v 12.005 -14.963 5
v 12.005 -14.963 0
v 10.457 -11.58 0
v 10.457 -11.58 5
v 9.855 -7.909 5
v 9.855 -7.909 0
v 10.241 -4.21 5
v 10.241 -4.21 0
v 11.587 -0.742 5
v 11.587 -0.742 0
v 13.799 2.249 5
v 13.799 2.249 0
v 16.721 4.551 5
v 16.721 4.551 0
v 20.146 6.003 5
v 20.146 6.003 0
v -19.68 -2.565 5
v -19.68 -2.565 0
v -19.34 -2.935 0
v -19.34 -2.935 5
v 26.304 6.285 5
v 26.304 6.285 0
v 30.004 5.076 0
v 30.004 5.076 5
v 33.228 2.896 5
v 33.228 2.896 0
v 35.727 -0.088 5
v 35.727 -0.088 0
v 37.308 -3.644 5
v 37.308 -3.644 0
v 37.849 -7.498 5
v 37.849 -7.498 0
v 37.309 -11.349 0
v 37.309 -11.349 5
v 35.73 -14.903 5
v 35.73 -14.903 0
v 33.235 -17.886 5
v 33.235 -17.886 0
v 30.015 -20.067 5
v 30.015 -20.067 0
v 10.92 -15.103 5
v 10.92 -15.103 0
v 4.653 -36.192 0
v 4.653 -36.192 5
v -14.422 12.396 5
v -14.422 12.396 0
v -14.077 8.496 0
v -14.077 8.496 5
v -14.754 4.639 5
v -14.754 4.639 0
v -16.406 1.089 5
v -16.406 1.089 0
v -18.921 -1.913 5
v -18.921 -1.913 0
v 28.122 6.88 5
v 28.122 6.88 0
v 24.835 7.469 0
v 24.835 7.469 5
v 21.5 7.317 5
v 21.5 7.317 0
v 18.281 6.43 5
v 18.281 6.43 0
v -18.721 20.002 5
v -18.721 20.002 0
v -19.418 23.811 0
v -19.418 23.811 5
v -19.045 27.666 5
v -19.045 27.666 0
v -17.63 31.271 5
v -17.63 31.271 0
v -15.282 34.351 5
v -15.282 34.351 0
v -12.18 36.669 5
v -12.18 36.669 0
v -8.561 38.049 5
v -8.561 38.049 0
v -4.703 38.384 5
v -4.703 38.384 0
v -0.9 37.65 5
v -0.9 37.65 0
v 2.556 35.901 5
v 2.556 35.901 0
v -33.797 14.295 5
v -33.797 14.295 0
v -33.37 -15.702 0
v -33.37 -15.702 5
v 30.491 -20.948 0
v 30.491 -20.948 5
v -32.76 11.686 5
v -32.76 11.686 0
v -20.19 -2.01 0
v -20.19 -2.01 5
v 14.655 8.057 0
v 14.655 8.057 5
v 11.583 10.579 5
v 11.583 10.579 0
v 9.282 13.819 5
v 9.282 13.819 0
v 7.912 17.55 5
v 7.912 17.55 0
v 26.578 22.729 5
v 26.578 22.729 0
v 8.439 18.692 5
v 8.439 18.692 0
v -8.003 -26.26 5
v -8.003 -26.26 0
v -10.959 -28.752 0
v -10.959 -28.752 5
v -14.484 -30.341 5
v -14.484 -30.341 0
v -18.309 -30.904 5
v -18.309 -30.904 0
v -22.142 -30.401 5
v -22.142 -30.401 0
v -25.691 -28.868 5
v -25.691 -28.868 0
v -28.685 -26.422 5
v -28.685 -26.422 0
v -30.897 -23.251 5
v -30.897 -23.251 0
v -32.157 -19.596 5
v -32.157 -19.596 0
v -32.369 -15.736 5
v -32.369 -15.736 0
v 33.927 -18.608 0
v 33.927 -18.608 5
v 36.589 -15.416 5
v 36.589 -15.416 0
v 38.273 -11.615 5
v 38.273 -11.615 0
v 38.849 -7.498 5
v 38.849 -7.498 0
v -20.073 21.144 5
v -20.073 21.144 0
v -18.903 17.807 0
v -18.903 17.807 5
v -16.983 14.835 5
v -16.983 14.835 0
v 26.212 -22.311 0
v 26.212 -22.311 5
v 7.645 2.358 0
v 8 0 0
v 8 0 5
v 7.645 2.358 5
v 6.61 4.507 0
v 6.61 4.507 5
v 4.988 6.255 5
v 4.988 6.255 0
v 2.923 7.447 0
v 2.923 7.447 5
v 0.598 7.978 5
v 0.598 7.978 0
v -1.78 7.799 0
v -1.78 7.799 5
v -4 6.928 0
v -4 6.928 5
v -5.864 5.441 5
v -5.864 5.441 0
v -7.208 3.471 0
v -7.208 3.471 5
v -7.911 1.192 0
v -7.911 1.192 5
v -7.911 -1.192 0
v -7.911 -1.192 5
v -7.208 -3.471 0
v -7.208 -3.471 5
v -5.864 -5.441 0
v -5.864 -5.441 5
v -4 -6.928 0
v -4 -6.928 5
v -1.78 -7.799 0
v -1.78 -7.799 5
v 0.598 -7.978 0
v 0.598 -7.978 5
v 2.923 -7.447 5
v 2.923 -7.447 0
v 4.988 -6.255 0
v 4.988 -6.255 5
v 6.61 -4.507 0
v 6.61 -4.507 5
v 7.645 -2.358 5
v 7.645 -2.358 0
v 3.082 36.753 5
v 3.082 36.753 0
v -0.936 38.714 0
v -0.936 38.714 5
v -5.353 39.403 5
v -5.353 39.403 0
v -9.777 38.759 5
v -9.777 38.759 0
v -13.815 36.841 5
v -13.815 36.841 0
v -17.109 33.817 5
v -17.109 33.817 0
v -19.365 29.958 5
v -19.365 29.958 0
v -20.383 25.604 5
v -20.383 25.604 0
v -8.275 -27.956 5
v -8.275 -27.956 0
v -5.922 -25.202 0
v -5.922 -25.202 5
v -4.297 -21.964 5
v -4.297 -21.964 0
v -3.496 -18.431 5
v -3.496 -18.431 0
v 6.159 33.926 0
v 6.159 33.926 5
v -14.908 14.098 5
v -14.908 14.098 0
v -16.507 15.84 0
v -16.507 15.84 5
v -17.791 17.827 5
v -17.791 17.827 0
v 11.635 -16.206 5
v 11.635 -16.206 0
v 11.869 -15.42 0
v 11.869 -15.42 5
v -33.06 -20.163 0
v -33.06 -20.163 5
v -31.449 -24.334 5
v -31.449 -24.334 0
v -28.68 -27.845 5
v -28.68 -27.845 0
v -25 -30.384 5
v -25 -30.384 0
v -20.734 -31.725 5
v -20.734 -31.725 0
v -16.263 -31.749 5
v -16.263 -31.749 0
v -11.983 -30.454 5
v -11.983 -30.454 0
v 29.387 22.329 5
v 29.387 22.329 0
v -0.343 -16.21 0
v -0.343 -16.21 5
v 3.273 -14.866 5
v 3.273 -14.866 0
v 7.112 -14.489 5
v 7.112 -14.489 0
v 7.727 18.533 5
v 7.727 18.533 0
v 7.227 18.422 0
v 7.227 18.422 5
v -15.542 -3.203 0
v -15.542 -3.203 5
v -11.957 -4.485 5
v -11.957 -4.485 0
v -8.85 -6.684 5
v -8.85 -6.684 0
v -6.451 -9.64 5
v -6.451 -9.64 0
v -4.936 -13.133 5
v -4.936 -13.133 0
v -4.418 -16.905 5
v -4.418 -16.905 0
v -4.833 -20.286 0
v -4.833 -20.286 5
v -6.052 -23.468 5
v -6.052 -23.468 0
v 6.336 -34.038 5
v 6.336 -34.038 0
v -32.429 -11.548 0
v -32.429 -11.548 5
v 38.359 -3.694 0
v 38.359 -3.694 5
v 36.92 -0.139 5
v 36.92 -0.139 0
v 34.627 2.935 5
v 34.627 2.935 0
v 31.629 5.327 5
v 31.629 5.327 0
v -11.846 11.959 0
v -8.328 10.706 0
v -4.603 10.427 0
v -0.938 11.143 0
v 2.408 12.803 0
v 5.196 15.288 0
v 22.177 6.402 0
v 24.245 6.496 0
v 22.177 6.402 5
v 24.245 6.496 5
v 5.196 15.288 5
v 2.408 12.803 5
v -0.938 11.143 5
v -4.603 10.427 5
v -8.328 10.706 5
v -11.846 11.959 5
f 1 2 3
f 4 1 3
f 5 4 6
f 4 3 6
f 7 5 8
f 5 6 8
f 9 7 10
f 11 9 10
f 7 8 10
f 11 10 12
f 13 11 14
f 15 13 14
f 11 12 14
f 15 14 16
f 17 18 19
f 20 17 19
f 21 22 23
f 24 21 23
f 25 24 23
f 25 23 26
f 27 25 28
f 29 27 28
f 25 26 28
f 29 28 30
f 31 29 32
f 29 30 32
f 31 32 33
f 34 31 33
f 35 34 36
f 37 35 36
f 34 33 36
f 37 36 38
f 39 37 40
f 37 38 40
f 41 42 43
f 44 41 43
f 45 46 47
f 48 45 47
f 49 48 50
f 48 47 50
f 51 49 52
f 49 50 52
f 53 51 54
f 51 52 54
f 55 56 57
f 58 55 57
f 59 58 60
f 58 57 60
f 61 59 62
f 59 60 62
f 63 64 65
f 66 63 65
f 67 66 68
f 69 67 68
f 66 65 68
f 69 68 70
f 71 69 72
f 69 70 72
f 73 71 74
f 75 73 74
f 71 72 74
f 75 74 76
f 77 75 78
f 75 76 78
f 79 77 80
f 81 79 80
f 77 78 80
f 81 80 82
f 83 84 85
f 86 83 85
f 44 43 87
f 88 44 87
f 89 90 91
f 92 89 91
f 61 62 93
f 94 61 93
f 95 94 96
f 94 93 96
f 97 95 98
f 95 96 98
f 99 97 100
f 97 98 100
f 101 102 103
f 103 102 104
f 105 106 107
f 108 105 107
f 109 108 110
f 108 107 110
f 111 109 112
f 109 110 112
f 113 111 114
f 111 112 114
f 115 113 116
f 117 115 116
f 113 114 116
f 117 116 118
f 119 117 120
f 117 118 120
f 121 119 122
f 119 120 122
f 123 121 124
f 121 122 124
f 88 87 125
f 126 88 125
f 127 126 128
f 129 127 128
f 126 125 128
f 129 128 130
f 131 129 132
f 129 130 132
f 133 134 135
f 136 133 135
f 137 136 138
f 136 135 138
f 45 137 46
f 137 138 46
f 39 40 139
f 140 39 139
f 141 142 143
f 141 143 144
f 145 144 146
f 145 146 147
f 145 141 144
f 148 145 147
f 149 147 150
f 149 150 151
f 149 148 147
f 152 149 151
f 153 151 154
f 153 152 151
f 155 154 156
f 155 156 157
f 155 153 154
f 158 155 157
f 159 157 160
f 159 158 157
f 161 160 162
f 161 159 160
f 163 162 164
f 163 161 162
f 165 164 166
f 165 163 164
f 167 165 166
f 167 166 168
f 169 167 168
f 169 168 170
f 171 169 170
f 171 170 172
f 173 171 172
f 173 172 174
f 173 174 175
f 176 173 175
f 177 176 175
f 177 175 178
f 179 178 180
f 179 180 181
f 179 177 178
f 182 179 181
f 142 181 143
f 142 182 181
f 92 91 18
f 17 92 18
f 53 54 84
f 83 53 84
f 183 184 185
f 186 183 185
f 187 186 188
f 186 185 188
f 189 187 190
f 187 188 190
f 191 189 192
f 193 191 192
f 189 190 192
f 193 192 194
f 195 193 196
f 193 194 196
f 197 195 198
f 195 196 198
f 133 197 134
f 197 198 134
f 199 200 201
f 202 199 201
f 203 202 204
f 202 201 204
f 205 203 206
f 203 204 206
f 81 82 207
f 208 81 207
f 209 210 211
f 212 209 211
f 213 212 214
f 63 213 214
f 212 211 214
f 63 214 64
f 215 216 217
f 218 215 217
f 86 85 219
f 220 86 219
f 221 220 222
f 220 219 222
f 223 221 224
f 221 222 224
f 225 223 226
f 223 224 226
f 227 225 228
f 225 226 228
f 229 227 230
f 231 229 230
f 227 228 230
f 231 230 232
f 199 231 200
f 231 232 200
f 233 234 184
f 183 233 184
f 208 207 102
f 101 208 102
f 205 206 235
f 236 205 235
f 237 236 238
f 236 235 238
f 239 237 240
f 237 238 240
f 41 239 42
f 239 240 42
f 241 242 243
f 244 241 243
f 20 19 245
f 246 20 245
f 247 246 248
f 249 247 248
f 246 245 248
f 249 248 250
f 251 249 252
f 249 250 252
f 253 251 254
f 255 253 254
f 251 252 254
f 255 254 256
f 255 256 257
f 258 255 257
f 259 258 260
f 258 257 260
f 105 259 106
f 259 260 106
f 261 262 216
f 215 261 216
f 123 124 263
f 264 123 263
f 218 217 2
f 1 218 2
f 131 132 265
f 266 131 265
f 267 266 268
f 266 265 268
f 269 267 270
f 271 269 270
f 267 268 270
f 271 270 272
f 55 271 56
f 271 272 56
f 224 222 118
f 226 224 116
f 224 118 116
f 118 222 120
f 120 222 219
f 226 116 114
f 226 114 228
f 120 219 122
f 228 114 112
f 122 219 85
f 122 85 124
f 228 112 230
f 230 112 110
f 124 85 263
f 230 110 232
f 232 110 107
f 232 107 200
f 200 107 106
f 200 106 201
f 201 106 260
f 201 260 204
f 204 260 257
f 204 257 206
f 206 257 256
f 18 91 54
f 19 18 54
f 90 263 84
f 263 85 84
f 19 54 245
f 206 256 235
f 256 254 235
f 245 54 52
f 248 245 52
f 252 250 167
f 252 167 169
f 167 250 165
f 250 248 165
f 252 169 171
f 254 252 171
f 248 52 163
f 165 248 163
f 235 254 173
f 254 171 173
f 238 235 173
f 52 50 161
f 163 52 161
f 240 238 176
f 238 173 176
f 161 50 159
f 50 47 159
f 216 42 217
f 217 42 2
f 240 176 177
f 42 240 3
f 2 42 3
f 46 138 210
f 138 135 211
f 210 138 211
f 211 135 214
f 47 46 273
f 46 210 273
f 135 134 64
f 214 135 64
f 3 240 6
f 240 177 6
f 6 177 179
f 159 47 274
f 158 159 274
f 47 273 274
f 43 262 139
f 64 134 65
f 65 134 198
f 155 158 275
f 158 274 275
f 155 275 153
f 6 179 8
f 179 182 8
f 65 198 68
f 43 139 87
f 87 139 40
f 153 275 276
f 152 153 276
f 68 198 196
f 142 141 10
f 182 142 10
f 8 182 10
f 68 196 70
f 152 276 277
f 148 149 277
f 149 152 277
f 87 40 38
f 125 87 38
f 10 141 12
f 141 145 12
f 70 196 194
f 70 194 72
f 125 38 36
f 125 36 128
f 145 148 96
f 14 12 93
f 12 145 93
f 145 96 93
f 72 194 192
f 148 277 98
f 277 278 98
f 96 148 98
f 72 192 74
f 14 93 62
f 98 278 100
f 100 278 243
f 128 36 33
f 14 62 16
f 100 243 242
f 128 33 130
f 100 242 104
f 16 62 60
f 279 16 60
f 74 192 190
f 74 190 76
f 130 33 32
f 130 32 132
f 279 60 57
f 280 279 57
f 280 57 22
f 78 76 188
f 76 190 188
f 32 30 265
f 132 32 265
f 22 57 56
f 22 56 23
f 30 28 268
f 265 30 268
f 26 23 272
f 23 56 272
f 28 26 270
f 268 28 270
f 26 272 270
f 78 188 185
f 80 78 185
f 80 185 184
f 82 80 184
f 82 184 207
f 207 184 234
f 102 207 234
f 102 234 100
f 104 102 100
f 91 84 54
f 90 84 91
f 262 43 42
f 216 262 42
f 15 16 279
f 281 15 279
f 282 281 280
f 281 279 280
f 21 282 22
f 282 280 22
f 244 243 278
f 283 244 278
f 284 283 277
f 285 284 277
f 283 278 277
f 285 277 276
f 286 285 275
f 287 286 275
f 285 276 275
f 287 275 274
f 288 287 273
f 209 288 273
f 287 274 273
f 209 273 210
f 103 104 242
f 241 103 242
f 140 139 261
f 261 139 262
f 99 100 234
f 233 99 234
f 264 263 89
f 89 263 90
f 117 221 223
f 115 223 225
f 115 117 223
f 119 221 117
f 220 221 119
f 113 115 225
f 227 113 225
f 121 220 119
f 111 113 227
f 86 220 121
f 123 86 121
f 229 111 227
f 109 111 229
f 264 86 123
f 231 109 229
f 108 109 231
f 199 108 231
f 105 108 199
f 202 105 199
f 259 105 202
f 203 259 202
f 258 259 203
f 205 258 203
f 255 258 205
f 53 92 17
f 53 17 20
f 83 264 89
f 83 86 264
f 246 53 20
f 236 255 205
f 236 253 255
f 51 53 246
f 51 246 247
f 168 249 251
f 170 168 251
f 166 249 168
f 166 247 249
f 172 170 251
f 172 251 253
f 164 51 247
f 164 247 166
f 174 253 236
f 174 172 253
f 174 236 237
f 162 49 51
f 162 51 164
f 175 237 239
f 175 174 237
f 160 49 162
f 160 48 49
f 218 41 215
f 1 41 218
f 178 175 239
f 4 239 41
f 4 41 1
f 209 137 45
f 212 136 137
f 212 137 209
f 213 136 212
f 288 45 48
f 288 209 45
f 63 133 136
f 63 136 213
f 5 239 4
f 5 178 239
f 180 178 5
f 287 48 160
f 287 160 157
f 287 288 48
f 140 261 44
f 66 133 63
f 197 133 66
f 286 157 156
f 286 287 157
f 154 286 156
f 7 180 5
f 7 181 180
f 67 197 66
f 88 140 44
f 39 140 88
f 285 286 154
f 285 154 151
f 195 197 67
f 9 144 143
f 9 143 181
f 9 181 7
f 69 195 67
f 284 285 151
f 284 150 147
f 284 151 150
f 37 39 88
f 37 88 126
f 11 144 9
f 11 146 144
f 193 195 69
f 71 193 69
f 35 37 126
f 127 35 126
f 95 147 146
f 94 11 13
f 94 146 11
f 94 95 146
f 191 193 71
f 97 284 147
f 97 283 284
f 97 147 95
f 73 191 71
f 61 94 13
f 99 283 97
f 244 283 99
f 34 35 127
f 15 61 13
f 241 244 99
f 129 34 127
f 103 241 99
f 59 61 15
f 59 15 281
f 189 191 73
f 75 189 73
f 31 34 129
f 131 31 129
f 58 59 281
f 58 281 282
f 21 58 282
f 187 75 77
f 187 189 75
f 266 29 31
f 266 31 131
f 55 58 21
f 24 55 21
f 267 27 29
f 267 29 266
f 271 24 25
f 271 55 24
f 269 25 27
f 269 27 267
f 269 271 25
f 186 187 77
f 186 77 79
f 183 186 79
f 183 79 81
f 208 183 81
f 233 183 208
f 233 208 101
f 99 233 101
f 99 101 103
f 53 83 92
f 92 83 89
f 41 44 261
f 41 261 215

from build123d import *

# Parameters (mm, degrees)
F0_R     = 8
F1_DEPTH = 5


with BuildPart() as f1:
    # F0 (on Top) → F1 (new body)
    with BuildSketch(Plane.XY):
        with BuildLine():
            ThreePointArc((38.8490344373, -7.4982368866), (35.8718628785, 1.471244496), (28.1221549341, 6.8802345627))
            ThreePointArc((28.1221549341, 6.8802345627), (27.2226565904, 6.5535105265), (26.3041545683, 6.2848101329))
            ThreePointArc((26.3041545683, 6.2848101329), (34.5815011117, 1.4914326892), (37.8490344373, -7.4982368866))
            ThreePointArc((37.8490344373, -7.4982368866), (35.7302878123, -14.9033579686), (30.0153461175, -20.0671111506))
            Line((30.0153461175, -20.0671111506), (26.2122119316, -22.3109136241))
            ThreePointArc((26.2122119316, -22.3109136241), (28.4028713862, -21.790282543), (30.4909167926, -20.9476011385))
            ThreePointArc((30.4909167926, -20.9476011385), (36.5892902301, -15.41567854), (38.8490344373, -7.4982368866))
        make_face()
        with BuildLine():
            ThreePointArc((11.6354406408, -16.2061715771), (11.2656060513, -15.6626309275), (10.919943616, -15.1034068738))
            Line((10.919943616, -15.1034068738), (4.6527002207, -36.1918316662))
            Line((4.6527002207, -36.1918316662), (30.4909167926, -20.9476011385))
            ThreePointArc((30.4909167926, -20.9476011385), (28.4028713862, -21.790282543), (26.2122119316, -22.3109136241))
            Line((26.2122119316, -22.3109136241), (6.3361573488, -34.0375417836))
            Line((6.3361573488, -34.0375417836), (11.6354406408, -16.2061715771))
        make_face()
        with BuildLine():
            ThreePointArc((28.1221549341, 6.8802345627), (23.1634660922, 7.4860881247), (18.2808163885, 6.4299700246))
            ThreePointArc((18.2808163885, 6.4299700246), (19.2063911412, 6.1867474035), (20.1455918313, 6.0030413071))
            ThreePointArc((20.1455918313, 6.0030413071), (23.2091706485, 6.4871331239), (26.3041545683, 6.2848101329))
            ThreePointArc((26.3041545683, 6.2848101329), (27.2226565904, 6.5535105265), (28.1221549341, 6.8802345627))
        make_face()
        with BuildLine():
            ThreePointArc((11.8690019815, -15.4202693139), (11.397115524, -15.25392267), (10.919943616, -15.1034068738))
            ThreePointArc((10.919943616, -15.1034068738), (11.2656060513, -15.6626309275), (11.6354406408, -16.2061715771))
            Line((11.6354406408, -16.2061715771), (11.8690019815, -15.4202693139))
        make_face()
        with BuildLine():
            ThreePointArc((20.1455918313, 6.0030413071), (19.2063911412, 6.1867474035), (18.2808163885, 6.4299700246))
            ThreePointArc((18.2808163885, 6.4299700246), (9.655402449, -2.646349524), (10.919943616, -15.1034068738))
            ThreePointArc((10.919943616, -15.1034068738), (11.397115524, -15.25392267), (11.8690019815, -15.4202693139))
            Line((11.8690019815, -15.4202693139), (12.0049821529, -14.9627144628))
            ThreePointArc((12.0049821529, -14.9627144628), (10.7982920028, -2.4308784123), (20.1455918313, 6.0030413071))
        make_face()
        with BuildLine():
            Line((26.5784435042, 22.7285549449), (8.4393064839, 18.6917133525))
            ThreePointArc((8.4393064839, 18.6917133525), (8.1876964566, 18.1152942206), (7.9121440123, 17.5499293192))
            Line((7.9121440123, 17.5499293192), (29.3867735594, 22.3290804795))
            Line((29.3867735594, 22.3290804795), (3.0820072992, 36.7533403216))
            ThreePointArc((3.0820072992, 36.7533403216), (4.7192641816, 35.4472223277), (6.158636429, 33.9257881863))
            Line((6.158636429, 33.9257881863), (26.5784435042, 22.7285549449))
        make_face()
        with BuildLine():
            ThreePointArc((7.9121440123, 17.5499293192), (8.1876964566, 18.1152942206), (8.4393064839, 18.6917133525))
            Line((8.4393064839, 18.6917133525), (7.7274834193, 18.5332980458))
            ThreePointArc((7.7274834193, 18.5332980458), (7.8116121335, 18.0400735592), (7.9121440123, 17.5499293192))
        make_face()
        with BuildLine():
            ThreePointArc((-14.4218573571, 12.3962462122), (-2.0581580843, 9.7870747046), (7.9121440123, 17.5499293192))
            ThreePointArc((7.9121440123, 17.5499293192), (7.8116121335, 18.0400735592), (7.7274834193, 18.5332980458))
            Line((7.7274834193, 18.5332980458), (7.2272436675, 18.421970333))
            ThreePointArc((7.2272436675, 18.421970333), (-2.7467318854, 10.6627009825), (-14.907533277, 14.0980115505))
            ThreePointArc((-14.907533277, 14.0980115505), (-14.6395764677, 13.2542976843), (-14.4218573571, 12.3962462122))
        make_face()
        with BuildLine():
            Line((2.555704028, 35.9014618202), (6.158636429, 33.9257881863))
            ThreePointArc((6.158636429, 33.9257881863), (4.7192641816, 35.4472223277), (3.0820072992, 36.7533403216))
            ThreePointArc((3.0820072992, 36.7533403216), (-13.8153698815, 36.8408290348), (-20.0726464643, 21.144475967))
            ThreePointArc((-20.0726464643, 21.144475967), (-19.3800207125, 20.593183388), (-18.7211221359, 20.0019925512))
            ThreePointArc((-18.7211221359, 20.0019925512), (-13.8112245946, 35.6176830282), (2.555704028, 35.9014618202))
        make_face()
        with BuildLine():
            ThreePointArc((-20.0726464643, 21.144475967), (-18.0308595518, 16.2642013697), (-14.4218573571, 12.3962462122))
            ThreePointArc((-14.4218573571, 12.3962462122), (-14.6395764677, 13.2542976843), (-14.907533277, 14.0980115505))
            ThreePointArc((-14.907533277, 14.0980115505), (-17.1908591544, 16.8067871532), (-18.7211221359, 20.0019925512))
            ThreePointArc((-18.7211221359, 20.0019925512), (-19.3800207125, 20.593183388), (-20.0726464643, 21.144475967))
        make_face()
        with BuildLine():
            ThreePointArc((-8.275330105, -27.9556597428), (-5.0113342557, -23.6320437442), (-3.4960276219, -18.4309698155))
            ThreePointArc((-3.4960276219, -18.4309698155), (-4.1118905803, -19.0296020384), (-4.6924818025, -19.6625013626))
            ThreePointArc((-4.6924818025, -19.6625013626), (-5.9051240284, -23.183557577), (-8.003150447, -26.2603453792))
            ThreePointArc((-8.003150447, -26.2603453792), (-8.1635176407, -27.1041048739), (-8.275330105, -27.9556597428))
        make_face()
        with BuildLine():
            ThreePointArc((-32.4289424962, -11.5476477284), (-33.0476433207, -13.5913198261), (-33.3698936049, -15.7021350969))
            ThreePointArc((-33.3698936049, -15.7021350969), (-24.9998603459, -30.3836790472), (-8.275330105, -27.9556597428))
            ThreePointArc((-8.275330105, -27.9556597428), (-8.1635176407, -27.1041048739), (-8.003150447, -26.2603453792))
            ThreePointArc((-8.003150447, -26.2603453792), (-23.9694406728, -29.7571251146), (-32.3693101655, -15.7359951816))
            Line((-32.3693101655, -15.7359951816), (-32.4289424962, -11.5476477284))
        make_face()
        with BuildLine():
            ThreePointArc((-20.1895506368, -2.0097101454), (-19.5561991387, -1.947983056), (-18.9207994891, -1.9131744502))
            Line((-18.9207994891, -1.9131744502), (-33.796980576, 14.2948246944))
            Line((-33.796980576, 14.2948246944), (-33.3698936049, -15.7021350969))
            ThreePointArc((-33.3698936049, -15.7021350969), (-33.0476433207, -13.5913198261), (-32.4289424962, -11.5476477284))
            Line((-32.4289424962, -11.5476477284), (-32.7597333746, 11.6858418158))
            Line((-32.7597333746, 11.6858418158), (-20.1895506368, -2.0097101454))
        make_face()
        with BuildLine():
            ThreePointArc((-19.6800914911, -2.5647795781), (-19.2950109131, -2.2453097311), (-18.9207994891, -1.9131744502))
            ThreePointArc((-18.9207994891, -1.9131744502), (-19.5561991387, -1.947983056), (-20.1895506368, -2.0097101454))
            Line((-20.1895506368, -2.0097101454), (-19.6800914911, -2.5647795781))
        make_face()
        with BuildLine():
            ThreePointArc((-3.4181808461, -16.9047512351), (-7.9907957387, -6.1219111722), (-18.9207994891, -1.9131744502))
            ThreePointArc((-18.9207994891, -1.9131744502), (-19.2950109131, -2.2453097311), (-19.6800914911, -2.5647795781))
            Line((-19.6800914911, -2.5647795781), (-19.340160936, -2.9351430547))
            ThreePointArc((-19.340160936, -2.9351430547), (-8.8502061716, -6.6844840845), (-4.4181808461, -16.9047512351))
            ThreePointArc((-4.4181808461, -16.9047512351), (-4.4869248616, -18.2904303809), (-4.6924818025, -19.6625013626))
            ThreePointArc((-4.6924818025, -19.6625013626), (-4.1118905803, -19.0296020384), (-3.4960276219, -18.4309698155))
            ThreePointArc((-3.4960276219, -18.4309698155), (-3.4376551817, -17.6688525497), (-3.4181808461, -16.9047512351))
        make_face()
        with BuildLine():
            ThreePointArc((18.2808163885, 6.4299700246), (11.5832094425, 10.578918544), (7.9121440123, 17.5499293192))
            ThreePointArc((7.9121440123, 17.5499293192), (-2.0581580843, 9.7870747046), (-14.4218573571, 12.3962462122))
            ThreePointArc((-14.4218573571, 12.3962462122), (-14.7542295678, 4.6387919255), (-18.9207994891, -1.9131744502))
            ThreePointArc((-18.9207994891, -1.9131744502), (-7.9907957387, -6.1219111722), (-3.4181808461, -16.9047512351))
            ThreePointArc((-3.4181808461, -16.9047512351), (-3.4376551817, -17.6688525497), (-3.4960276219, -18.4309698155))
            ThreePointArc((-3.4960276219, -18.4309698155), (3.2731601147, -14.8661881946), (10.919943616, -15.1034068738))
            ThreePointArc((10.919943616, -15.1034068738), (9.655402449, -2.646349524), (18.2808163885, 6.4299700246))
        make_face()
        Circle(F0_R, mode=Mode.SUBTRACT)
    extrude(amount=F1_DEPTH)


solid = f1.part
